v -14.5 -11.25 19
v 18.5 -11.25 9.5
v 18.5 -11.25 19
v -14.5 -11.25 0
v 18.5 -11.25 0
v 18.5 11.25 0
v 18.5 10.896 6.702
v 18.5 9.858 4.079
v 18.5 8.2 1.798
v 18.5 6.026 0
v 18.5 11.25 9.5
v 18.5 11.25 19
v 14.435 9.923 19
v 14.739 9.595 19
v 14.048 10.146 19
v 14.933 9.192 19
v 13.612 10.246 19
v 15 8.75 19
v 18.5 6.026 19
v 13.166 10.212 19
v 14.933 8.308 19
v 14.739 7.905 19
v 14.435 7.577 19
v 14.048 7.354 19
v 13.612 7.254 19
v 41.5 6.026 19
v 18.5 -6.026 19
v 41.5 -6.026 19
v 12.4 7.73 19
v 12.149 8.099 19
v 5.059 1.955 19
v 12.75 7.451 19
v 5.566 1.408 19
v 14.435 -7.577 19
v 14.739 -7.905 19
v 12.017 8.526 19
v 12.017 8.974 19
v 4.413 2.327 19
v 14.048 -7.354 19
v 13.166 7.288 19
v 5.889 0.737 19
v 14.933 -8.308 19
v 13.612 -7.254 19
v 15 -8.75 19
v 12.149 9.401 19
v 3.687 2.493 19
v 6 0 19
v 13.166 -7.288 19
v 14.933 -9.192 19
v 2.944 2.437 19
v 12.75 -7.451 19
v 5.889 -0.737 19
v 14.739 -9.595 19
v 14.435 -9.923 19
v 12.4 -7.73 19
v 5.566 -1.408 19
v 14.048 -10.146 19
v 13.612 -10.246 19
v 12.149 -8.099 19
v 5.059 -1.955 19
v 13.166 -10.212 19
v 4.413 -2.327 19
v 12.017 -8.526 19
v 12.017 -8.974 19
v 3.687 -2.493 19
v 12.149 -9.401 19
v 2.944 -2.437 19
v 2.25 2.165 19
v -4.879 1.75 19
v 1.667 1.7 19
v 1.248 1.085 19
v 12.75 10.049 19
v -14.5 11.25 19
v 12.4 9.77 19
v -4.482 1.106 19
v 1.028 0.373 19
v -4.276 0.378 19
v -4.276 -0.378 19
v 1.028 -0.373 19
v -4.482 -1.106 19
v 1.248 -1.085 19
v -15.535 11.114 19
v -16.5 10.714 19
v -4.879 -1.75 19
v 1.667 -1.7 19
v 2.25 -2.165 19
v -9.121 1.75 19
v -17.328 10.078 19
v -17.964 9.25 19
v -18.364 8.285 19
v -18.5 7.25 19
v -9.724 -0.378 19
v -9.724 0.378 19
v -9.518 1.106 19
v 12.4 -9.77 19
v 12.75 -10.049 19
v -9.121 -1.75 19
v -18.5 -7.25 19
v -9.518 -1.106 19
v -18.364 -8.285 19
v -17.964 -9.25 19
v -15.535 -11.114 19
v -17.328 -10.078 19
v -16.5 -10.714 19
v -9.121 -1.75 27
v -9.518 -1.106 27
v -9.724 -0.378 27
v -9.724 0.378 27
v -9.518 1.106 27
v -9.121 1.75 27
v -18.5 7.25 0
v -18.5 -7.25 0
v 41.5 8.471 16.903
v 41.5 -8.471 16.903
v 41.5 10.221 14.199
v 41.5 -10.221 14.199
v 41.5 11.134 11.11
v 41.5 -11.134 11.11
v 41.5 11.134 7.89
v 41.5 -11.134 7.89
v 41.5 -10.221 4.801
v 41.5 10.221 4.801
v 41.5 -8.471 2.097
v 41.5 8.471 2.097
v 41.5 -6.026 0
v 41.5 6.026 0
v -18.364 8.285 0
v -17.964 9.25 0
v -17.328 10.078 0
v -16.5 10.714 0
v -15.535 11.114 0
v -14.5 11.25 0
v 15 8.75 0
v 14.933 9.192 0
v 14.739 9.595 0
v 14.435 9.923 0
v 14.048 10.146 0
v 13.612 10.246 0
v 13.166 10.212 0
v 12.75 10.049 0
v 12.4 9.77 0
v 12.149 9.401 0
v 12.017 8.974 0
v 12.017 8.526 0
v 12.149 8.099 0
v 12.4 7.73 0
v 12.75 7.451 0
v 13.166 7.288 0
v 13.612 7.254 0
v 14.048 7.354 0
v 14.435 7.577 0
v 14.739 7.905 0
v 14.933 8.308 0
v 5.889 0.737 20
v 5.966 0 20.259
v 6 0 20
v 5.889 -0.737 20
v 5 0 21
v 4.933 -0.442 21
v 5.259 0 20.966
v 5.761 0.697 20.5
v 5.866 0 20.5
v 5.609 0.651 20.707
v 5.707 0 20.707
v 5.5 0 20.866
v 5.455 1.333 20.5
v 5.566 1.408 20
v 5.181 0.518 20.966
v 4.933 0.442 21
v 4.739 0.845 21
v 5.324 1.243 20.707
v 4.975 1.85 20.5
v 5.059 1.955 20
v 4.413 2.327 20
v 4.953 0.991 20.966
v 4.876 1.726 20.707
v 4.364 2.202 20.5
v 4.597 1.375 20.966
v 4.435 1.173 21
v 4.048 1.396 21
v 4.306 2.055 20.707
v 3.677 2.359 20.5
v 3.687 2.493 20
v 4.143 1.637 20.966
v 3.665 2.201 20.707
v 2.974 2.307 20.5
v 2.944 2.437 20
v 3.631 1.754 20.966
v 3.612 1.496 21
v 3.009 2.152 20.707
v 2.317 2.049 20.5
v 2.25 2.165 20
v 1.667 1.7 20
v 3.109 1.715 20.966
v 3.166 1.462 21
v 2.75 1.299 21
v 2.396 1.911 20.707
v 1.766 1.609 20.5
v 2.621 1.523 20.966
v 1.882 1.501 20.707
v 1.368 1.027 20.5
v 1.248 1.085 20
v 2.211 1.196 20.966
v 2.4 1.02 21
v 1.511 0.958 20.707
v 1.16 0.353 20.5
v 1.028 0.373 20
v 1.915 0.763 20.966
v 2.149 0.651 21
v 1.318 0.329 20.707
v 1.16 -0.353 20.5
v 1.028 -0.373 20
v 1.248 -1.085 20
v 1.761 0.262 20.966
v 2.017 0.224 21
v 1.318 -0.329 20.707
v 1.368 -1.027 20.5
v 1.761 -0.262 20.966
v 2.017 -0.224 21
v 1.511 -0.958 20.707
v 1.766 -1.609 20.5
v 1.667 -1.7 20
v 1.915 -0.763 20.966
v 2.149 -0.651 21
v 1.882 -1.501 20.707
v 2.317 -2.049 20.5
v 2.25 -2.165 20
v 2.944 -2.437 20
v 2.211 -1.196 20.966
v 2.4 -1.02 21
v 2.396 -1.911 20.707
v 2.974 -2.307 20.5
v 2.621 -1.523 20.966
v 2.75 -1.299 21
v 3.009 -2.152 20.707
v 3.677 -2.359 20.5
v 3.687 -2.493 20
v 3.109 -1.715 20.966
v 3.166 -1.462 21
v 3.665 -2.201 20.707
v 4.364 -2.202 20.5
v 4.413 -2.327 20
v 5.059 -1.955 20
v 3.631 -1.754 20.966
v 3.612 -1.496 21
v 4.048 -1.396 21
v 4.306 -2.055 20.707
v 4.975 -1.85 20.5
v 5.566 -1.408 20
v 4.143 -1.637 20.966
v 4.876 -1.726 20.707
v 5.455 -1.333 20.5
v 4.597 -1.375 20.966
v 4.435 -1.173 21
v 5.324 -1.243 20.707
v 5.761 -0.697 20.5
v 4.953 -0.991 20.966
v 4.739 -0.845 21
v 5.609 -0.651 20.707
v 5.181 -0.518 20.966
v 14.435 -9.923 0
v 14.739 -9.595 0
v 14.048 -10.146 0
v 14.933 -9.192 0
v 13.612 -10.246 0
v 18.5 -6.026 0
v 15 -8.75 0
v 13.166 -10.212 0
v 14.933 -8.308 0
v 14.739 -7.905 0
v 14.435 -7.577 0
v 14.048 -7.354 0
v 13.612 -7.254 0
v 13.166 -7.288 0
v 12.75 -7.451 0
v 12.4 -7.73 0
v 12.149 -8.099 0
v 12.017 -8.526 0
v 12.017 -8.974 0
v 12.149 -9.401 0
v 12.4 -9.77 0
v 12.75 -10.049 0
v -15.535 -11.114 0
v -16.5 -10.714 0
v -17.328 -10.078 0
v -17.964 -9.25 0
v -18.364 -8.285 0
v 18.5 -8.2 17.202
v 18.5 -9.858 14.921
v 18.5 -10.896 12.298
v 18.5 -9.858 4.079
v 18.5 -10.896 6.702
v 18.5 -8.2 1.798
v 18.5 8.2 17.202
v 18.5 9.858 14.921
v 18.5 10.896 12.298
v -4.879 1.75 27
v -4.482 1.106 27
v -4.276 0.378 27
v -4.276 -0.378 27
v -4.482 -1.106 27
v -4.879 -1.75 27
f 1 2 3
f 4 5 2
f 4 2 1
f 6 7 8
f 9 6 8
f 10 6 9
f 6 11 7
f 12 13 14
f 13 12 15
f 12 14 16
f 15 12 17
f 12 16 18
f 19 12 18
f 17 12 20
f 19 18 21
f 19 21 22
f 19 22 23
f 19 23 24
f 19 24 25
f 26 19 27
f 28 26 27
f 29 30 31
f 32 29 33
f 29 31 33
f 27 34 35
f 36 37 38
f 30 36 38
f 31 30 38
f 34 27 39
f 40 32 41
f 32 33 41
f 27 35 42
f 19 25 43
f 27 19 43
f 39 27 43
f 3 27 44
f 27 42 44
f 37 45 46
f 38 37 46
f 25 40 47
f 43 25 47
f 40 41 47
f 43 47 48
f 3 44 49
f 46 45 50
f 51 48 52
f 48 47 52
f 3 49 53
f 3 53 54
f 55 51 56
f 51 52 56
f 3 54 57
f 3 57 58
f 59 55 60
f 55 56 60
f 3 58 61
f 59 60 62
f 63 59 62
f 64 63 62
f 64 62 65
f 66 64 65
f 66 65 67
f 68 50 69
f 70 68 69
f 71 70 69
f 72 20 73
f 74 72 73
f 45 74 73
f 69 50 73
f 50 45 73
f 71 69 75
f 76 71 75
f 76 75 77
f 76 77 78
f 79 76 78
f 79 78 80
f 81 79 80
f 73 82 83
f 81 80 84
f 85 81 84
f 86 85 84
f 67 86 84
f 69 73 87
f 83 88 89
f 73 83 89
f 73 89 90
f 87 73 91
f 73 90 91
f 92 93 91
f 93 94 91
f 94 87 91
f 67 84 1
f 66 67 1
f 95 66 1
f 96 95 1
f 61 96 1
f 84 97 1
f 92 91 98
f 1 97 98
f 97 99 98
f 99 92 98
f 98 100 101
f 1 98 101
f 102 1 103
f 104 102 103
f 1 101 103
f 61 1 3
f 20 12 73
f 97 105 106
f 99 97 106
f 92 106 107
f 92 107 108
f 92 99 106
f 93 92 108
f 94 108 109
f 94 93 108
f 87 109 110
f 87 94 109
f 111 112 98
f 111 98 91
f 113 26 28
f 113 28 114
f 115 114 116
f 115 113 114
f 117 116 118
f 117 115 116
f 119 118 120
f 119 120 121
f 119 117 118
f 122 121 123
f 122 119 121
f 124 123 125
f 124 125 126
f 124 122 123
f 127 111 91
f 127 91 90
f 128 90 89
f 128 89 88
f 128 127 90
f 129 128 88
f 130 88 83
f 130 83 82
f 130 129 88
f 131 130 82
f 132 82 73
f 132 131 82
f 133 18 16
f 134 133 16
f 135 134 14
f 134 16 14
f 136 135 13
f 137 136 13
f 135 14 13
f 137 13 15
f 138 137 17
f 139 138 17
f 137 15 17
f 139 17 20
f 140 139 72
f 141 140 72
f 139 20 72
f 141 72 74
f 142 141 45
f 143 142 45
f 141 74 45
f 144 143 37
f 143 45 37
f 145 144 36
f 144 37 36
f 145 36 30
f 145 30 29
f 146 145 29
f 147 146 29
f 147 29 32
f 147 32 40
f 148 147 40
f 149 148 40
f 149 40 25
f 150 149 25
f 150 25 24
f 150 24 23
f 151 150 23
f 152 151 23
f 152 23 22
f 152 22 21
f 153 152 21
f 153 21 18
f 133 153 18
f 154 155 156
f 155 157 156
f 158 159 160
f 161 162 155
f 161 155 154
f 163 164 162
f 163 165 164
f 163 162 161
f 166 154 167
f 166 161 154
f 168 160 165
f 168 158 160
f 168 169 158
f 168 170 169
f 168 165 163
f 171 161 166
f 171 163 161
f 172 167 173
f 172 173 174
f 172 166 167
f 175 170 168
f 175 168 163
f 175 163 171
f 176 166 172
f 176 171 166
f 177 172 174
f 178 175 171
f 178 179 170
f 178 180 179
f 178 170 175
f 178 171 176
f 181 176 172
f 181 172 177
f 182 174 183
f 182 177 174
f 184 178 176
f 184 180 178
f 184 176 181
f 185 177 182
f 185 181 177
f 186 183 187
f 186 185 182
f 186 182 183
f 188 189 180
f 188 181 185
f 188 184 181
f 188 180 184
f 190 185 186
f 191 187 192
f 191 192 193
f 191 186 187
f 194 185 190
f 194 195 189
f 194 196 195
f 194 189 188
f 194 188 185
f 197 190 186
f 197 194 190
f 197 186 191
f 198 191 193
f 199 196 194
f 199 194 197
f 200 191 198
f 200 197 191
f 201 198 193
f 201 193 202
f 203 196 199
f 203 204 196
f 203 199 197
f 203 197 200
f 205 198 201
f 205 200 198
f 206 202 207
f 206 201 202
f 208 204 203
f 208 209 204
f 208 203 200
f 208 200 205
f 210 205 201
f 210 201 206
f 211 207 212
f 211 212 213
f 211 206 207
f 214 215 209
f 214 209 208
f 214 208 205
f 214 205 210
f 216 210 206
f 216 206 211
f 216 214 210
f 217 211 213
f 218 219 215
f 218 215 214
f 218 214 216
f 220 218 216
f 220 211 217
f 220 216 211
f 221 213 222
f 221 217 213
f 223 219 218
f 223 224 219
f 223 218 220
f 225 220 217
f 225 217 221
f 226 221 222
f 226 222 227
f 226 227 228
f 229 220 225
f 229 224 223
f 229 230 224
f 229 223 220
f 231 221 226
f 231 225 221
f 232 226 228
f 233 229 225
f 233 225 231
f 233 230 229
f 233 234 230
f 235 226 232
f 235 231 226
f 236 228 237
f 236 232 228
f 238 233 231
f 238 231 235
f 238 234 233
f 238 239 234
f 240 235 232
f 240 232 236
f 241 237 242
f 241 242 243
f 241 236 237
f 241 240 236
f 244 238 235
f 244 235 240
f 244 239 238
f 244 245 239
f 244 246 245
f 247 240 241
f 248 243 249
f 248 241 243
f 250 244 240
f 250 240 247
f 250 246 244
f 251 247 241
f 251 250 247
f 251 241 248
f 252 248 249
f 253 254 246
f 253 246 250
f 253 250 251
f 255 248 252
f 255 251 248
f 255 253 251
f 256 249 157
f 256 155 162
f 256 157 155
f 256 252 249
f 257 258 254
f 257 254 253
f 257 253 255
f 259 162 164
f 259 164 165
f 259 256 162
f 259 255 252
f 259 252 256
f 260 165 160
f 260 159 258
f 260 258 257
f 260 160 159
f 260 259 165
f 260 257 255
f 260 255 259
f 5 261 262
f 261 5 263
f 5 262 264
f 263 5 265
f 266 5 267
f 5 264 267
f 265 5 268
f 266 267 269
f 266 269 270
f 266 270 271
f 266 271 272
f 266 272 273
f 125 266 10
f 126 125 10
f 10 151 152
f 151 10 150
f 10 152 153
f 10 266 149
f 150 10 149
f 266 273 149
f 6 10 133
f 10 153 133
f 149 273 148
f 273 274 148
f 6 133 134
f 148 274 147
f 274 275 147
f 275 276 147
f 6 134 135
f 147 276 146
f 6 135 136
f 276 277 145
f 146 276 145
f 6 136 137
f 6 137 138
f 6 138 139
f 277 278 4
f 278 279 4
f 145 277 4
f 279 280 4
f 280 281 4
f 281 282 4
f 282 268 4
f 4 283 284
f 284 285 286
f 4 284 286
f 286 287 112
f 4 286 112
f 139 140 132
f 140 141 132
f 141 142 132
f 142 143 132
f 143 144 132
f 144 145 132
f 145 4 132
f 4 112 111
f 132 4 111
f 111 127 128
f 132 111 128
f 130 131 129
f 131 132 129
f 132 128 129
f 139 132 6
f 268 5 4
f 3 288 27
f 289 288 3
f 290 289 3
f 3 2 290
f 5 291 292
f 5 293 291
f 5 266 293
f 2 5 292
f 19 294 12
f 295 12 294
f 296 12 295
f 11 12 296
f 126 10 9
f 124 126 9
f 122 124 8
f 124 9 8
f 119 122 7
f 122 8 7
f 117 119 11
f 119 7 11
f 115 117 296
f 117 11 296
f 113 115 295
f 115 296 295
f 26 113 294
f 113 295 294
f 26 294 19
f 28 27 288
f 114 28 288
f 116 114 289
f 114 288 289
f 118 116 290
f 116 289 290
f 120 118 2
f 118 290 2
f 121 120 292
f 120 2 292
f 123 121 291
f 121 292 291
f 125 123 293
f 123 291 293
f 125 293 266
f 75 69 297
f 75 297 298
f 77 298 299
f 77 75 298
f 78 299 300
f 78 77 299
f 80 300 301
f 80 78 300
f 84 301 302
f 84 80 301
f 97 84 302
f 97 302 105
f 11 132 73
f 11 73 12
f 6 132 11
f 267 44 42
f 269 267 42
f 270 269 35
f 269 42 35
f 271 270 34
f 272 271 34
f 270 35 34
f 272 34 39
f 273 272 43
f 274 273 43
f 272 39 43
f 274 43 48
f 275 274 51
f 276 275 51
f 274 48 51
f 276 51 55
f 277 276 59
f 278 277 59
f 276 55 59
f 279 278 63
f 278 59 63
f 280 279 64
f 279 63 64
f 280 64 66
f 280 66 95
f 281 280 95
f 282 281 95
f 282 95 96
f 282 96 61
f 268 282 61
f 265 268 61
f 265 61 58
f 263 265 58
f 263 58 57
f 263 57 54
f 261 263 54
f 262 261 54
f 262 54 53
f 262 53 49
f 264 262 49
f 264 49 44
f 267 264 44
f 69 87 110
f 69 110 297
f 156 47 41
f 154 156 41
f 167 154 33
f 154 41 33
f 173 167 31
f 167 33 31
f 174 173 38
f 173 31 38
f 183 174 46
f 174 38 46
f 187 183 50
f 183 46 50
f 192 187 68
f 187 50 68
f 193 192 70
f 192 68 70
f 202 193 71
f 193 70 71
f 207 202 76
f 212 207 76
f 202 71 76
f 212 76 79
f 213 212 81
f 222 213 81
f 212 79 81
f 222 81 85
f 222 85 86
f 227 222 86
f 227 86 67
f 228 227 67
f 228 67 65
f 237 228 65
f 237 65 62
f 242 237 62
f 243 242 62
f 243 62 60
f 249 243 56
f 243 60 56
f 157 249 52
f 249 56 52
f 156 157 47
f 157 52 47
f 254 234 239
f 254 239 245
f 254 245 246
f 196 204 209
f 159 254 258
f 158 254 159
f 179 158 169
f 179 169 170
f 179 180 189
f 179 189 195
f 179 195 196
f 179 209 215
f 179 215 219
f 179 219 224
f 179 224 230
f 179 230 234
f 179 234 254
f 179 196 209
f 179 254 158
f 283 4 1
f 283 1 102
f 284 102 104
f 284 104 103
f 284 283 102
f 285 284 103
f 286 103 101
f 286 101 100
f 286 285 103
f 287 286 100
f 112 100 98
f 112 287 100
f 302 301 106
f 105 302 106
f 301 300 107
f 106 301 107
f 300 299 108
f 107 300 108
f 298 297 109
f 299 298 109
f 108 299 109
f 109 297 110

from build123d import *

# Parameters (mm, degrees)
BOSS_EXTRUDE1_DEPTH = 19
BOSS_EXTRUDE2_DEPTH = 23
BOSS_EXTRUDE3_DEPTH = 8
SKETCH4_R           = 2.5
BOSS_EXTRUDE4_DEPTH = 2
FILLET1_R           = 1
SKETCH5_R           = 1.5
CUT_EXTRUDE1_DEPTH  = 48.008642822


with BuildPart() as part:
    # Sketch1 → Boss-Extrude1 (new body)
    with BuildSketch(Plane.XY):
        with BuildLine():
            Line((-14.5, 11.25), (18.5, 11.25))
            Line((18.5, 11.25), (18.5, -11.25))
            Line((18.5, -11.25), (-14.5, -11.25))
            ThreePointArc((-14.5, -11.25), (-17.328427125, -10.078427125), (-18.5, -7.25))
            Line((-18.5, -7.25), (-18.5, 7.25))
            ThreePointArc((-18.5, 7.25), (-17.328427125, 10.078427125), (-14.5, 11.25))
        make_face()
    extrude(amount=BOSS_EXTRUDE1_DEPTH)

    # Sketch2 → Boss-Extrude2 (add)
    with BuildSketch(Plane(origin=(18.5, 0, 0), x_dir=(0, 0, -1), z_dir=(1, 0, 0))):
        with BuildLine():
            Line((-19, 6.025985397), (-19, -6.025985397))
            ThreePointArc((-19, -6.025985397), (-9.5, -11.25), (0, -6.025985397))
            Line((0, -6.025985397), (0, 6.025985397))
            ThreePointArc((0, 6.025985397), (-9.5, 11.25), (-19, 6.025985397))
        make_face()
    extrude(amount=BOSS_EXTRUDE2_DEPTH)

    # Sketch3 → Boss-Extrude3 (add)
    with BuildSketch(Plane.XY.offset(19)):
        with BuildLine():
            Line((-9.121320344, 1.75), (-4.878679656, 1.75))
            ThreePointArc((-4.878679656, 1.75), (-4.25, 0), (-4.878679656, -1.75))
            Line((-4.878679656, -1.75), (-9.121320344, -1.75))
            ThreePointArc((-9.121320344, -1.75), (-9.75, 0), (-9.121320344, 1.75))
        make_face()
    extrude(amount=BOSS_EXTRUDE3_DEPTH)

    # Sketch4 → Boss-Extrude4 (add)
    with BuildSketch(Plane.XY.offset(19)):
        with Locations((3.5, 0)):
            Circle(SKETCH4_R)
    extrude(amount=BOSS_EXTRUDE4_DEPTH)

    # Fillet1
    fillet1_edges = [part.edges().sort_by_distance(p)[0] for p in [
        (1, 0, 21),
    ]]
    fillet(fillet1_edges, radius=FILLET1_R)

    # Sketch5 → Cut-Extrude1 (cut, through all)
    with BuildSketch(Plane.XY.offset(19)):
        with Locations((13.5, 8.75)):
            Circle(SKETCH5_R)
        with Locations((13.5, -8.75)):
            Circle(SKETCH5_R)
    extrude(amount=-CUT_EXTRUDE1_DEPTH, mode=Mode.SUBTRACT)


solid = part.part
